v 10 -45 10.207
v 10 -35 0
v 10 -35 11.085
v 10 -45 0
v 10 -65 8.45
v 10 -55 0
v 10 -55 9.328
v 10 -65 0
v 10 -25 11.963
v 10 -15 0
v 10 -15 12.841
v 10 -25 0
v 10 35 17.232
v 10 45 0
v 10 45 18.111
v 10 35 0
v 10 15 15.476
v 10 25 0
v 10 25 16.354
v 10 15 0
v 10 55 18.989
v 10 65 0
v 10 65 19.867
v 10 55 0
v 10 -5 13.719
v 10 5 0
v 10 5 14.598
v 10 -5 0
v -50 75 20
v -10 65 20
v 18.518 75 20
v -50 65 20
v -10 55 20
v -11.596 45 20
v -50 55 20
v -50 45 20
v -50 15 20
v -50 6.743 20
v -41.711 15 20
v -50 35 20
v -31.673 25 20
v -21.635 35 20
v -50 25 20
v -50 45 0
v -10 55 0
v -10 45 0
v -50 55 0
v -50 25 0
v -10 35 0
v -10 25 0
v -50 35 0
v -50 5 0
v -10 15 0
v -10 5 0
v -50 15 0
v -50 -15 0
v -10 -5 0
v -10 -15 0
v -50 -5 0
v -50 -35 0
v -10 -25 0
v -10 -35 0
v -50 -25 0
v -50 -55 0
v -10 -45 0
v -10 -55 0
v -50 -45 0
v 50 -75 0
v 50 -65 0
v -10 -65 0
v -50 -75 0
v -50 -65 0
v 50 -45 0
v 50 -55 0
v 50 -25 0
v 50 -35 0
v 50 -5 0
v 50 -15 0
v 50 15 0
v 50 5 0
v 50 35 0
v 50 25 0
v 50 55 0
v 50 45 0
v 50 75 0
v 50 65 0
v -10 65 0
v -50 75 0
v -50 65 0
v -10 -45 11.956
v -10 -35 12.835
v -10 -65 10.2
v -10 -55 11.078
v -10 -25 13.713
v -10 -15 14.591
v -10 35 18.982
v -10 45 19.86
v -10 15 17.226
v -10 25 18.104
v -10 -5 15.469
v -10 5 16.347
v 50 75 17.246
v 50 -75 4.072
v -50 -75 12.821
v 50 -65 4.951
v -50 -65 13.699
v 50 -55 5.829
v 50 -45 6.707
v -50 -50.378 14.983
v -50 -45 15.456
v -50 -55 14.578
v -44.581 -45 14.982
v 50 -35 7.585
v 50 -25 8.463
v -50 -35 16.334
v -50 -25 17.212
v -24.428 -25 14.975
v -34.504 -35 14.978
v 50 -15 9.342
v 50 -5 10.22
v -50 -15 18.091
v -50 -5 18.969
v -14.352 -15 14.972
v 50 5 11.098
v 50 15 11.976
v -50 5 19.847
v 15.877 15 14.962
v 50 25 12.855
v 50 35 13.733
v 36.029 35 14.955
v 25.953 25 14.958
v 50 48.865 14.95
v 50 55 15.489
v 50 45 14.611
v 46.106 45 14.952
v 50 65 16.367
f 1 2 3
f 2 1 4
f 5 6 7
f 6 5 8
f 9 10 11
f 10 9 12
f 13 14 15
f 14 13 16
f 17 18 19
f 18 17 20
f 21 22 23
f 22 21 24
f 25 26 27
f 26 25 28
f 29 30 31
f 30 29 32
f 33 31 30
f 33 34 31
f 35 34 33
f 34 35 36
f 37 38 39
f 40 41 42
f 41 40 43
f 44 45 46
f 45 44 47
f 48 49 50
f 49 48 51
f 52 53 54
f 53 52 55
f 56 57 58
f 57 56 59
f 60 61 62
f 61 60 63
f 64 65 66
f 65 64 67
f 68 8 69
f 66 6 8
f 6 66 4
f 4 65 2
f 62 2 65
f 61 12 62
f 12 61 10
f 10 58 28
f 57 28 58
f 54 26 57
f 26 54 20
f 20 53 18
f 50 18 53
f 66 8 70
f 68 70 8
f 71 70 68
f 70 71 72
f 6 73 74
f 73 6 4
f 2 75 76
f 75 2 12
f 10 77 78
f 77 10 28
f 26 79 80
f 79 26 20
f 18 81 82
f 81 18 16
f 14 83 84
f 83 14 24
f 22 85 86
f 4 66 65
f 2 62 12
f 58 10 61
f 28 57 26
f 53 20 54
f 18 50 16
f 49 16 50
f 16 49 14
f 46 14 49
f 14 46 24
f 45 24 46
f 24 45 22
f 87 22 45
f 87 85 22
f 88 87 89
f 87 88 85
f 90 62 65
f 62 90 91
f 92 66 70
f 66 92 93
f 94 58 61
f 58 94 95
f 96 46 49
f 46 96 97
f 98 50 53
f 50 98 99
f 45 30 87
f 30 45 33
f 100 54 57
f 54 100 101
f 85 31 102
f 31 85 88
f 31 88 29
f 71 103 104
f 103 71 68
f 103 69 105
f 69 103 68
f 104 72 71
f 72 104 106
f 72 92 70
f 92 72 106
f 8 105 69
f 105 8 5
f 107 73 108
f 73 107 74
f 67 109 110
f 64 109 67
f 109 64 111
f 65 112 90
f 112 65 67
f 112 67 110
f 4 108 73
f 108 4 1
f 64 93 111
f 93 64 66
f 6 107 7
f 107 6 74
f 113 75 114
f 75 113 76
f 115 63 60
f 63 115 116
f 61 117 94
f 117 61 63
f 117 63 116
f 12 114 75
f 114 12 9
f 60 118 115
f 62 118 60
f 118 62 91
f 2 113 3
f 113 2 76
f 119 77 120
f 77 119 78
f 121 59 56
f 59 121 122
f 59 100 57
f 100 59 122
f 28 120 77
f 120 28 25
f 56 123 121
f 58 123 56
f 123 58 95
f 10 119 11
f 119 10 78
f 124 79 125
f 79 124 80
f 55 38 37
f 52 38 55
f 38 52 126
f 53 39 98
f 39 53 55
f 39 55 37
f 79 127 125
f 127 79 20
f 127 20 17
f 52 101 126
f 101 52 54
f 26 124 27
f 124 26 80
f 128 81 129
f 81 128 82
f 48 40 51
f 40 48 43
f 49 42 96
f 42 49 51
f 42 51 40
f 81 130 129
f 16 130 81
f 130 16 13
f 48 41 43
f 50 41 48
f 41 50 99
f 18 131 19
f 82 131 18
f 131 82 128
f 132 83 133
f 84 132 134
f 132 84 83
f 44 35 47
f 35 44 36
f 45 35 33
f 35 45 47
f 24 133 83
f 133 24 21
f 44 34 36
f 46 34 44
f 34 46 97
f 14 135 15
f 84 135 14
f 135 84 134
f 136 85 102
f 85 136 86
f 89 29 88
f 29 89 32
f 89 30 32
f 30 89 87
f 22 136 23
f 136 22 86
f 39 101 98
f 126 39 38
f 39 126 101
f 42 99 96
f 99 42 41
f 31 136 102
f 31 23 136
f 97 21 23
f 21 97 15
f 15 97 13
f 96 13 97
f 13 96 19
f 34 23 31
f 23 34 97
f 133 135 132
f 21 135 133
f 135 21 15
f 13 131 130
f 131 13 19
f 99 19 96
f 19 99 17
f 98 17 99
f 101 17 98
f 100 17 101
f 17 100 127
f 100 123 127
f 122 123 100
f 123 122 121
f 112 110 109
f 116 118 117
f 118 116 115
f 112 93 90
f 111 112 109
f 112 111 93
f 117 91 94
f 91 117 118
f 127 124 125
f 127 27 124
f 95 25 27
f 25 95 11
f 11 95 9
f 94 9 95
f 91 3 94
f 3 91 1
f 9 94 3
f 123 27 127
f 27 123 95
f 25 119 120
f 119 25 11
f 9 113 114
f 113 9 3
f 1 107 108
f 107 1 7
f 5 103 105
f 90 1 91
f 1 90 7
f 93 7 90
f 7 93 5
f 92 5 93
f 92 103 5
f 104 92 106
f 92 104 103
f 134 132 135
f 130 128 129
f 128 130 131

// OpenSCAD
z_height = 20;

y_length = 150;
y_step = 10;

inside_x = 20;
outside_x = 100;

difference() {
translate([-inside_x/2, -y_length/2, 0])
union() {
  cube([inside_x, y_length, z_height], false);

  translate([-(outside_x/2 - inside_x/2), 0 * y_step, 0])
  cube([outside_x, y_step, z_height], false);

  translate([-(outside_x/2 - inside_x/2), 2 * y_step, 0])
  cube([outside_x, y_step, z_height], false);

  translate([-(outside_x/2 - inside_x/2), 4 * y_step, 0])
  cube([outside_x, y_step, z_height], false);

  translate([-(outside_x/2 - inside_x/2), 6 * y_step, 0])
  cube([outside_x, y_step, z_height], false);

  translate([-(outside_x/2 - inside_x/2), 8 * y_step, 0])
  cube([outside_x, y_step, z_height], false);

  translate([-(outside_x/2 - inside_x/2), 10 * y_step, 0])
  cube([outside_x, y_step, z_height], false);

  translate([-(outside_x/2 - inside_x/2), 12 * y_step, 0])
  cube([outside_x, y_step, z_height], false);

  translate([-(outside_x/2 - inside_x/2), 14 * y_step, 0])
  cube([outside_x, y_step, z_height], false);
}

translate([-100, -100, 15])
rotate([5, 5, 0])
cube([200, 200, 20]);
}
